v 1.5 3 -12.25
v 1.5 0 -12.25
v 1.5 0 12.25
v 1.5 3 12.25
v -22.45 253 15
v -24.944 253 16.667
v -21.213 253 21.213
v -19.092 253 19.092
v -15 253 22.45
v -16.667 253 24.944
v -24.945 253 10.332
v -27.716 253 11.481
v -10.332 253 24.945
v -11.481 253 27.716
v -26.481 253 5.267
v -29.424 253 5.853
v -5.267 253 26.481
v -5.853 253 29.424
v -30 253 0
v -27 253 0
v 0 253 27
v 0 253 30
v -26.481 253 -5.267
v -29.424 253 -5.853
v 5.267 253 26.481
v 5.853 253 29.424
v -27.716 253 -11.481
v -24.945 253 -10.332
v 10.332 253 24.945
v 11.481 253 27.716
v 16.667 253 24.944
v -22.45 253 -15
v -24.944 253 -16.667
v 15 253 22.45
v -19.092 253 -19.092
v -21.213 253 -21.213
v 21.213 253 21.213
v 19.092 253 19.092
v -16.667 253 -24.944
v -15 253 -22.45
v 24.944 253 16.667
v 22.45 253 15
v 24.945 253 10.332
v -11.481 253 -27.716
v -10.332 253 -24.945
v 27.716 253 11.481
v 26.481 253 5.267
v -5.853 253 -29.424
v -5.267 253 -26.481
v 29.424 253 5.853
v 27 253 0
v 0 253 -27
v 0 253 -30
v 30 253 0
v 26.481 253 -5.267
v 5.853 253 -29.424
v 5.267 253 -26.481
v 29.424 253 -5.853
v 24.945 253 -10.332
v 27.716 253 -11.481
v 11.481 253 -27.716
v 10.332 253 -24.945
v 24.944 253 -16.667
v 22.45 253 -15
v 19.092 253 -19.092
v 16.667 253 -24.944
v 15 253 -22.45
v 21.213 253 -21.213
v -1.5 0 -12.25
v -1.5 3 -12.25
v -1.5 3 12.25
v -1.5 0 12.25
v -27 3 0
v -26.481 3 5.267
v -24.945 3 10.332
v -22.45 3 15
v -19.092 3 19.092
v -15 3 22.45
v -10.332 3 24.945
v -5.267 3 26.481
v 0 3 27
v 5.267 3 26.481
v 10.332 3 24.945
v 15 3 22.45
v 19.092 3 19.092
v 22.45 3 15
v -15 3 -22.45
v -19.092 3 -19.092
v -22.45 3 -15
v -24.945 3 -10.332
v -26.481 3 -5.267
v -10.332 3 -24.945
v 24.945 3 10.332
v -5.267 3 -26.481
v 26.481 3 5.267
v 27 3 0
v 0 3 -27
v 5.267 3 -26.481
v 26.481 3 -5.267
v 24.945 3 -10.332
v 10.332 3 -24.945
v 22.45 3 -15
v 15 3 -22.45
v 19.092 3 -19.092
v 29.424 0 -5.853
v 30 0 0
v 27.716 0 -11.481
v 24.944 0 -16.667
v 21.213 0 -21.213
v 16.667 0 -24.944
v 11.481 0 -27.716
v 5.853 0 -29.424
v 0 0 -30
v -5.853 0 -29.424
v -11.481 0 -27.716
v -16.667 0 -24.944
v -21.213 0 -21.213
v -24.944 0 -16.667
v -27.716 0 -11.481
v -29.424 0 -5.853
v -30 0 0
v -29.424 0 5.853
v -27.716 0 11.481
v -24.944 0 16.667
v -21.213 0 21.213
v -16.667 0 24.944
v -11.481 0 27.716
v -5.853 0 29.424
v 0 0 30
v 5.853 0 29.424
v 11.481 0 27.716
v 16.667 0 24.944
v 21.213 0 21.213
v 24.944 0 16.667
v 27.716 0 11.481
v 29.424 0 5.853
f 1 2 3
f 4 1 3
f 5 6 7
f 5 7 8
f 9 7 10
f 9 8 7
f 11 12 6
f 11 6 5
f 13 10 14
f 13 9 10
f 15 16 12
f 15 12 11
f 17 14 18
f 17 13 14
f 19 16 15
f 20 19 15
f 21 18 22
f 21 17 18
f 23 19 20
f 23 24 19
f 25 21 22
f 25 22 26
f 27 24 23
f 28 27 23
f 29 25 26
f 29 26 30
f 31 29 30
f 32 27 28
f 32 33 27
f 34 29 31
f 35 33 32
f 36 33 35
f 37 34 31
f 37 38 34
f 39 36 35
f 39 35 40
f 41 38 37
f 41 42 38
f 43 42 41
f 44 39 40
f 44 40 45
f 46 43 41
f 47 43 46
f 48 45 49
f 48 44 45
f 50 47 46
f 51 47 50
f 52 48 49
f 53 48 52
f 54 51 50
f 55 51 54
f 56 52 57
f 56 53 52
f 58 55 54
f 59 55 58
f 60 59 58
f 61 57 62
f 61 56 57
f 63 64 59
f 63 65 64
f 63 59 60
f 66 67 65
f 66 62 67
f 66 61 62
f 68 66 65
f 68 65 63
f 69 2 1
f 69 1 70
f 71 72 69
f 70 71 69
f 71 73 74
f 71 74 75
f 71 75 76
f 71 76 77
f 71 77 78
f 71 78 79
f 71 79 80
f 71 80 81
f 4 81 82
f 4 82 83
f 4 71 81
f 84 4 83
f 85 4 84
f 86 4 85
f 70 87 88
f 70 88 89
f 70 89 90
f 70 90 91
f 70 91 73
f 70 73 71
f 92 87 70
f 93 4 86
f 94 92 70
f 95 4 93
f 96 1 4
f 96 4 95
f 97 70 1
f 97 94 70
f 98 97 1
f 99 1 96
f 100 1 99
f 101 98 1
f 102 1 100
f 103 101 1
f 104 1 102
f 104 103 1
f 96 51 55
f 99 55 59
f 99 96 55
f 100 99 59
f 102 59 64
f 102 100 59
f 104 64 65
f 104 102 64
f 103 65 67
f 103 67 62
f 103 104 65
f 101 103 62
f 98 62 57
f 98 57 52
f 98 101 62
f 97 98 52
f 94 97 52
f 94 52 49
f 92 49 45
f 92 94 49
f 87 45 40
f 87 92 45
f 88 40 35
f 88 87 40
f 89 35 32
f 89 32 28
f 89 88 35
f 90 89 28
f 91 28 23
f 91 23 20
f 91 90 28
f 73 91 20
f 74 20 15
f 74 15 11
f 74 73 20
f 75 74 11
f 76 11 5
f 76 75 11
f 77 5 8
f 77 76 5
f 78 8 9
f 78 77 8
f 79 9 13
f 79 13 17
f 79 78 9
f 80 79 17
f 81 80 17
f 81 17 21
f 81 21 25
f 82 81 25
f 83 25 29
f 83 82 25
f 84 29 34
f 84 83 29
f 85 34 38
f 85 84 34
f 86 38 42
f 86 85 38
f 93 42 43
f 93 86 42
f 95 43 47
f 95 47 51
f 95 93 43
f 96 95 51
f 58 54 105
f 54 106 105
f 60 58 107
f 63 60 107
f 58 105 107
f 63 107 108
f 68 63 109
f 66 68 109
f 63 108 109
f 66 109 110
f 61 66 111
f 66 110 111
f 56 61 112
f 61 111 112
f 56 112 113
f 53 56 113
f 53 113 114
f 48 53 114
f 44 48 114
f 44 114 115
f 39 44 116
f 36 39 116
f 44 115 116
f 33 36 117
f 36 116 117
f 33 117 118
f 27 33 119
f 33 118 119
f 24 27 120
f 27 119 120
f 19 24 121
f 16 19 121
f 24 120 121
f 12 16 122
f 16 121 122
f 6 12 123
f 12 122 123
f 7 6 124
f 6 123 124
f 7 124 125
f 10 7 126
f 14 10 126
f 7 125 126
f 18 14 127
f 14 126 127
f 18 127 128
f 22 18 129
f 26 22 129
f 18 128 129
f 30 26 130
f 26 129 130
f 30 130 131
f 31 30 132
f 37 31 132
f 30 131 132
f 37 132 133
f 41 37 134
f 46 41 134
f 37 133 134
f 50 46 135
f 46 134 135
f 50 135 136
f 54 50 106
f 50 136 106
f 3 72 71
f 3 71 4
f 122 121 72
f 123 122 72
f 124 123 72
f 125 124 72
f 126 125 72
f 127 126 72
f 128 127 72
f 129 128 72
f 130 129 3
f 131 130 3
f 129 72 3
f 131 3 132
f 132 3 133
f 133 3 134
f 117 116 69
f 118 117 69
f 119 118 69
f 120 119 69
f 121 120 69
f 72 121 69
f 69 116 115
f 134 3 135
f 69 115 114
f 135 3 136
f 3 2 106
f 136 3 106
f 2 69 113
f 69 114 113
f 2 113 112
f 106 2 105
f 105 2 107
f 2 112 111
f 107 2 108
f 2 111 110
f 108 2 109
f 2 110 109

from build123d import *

# Parameters (mm, degrees)
SKETCH1_R           = 30
BOSS_EXTRUDE1_DEPTH = 3
SKETCH2_R           = 30
SKETCH2_R_2         = 27
BOSS_EXTRUDE2_DEPTH = 250
CUT_EXTRUDE1_DEPTH  = 44


with BuildPart() as part:
    # Sketch1 → Boss-Extrude1 (new body)
    with BuildSketch(Plane(origin=(0, 0, 0), x_dir=(1, 0, 0), z_dir=(0, 1, 0))):
        Circle(SKETCH1_R)
    extrude(amount=BOSS_EXTRUDE1_DEPTH)

    # Sketch2 → Boss-Extrude2 (add)
    with BuildSketch(Plane(origin=(0, 3, 0), x_dir=(1, 0, 0), z_dir=(0, 1, 0))):
        Circle(SKETCH2_R)
        Circle(SKETCH2_R_2, mode=Mode.SUBTRACT)
    extrude(amount=BOSS_EXTRUDE2_DEPTH)

    # Sketch3 → Cut-Extrude1 (cut)
    with BuildSketch(Plane.XZ):
        Polygon((-1.5, 0), (-1.5, 12.25), (1.5, 12.25), (1.5, 0), (1.5, -12.25), (-1.5, -12.25), align=None)
    extrude(amount=-CUT_EXTRUDE1_DEPTH, mode=Mode.SUBTRACT)


solid = part.part
